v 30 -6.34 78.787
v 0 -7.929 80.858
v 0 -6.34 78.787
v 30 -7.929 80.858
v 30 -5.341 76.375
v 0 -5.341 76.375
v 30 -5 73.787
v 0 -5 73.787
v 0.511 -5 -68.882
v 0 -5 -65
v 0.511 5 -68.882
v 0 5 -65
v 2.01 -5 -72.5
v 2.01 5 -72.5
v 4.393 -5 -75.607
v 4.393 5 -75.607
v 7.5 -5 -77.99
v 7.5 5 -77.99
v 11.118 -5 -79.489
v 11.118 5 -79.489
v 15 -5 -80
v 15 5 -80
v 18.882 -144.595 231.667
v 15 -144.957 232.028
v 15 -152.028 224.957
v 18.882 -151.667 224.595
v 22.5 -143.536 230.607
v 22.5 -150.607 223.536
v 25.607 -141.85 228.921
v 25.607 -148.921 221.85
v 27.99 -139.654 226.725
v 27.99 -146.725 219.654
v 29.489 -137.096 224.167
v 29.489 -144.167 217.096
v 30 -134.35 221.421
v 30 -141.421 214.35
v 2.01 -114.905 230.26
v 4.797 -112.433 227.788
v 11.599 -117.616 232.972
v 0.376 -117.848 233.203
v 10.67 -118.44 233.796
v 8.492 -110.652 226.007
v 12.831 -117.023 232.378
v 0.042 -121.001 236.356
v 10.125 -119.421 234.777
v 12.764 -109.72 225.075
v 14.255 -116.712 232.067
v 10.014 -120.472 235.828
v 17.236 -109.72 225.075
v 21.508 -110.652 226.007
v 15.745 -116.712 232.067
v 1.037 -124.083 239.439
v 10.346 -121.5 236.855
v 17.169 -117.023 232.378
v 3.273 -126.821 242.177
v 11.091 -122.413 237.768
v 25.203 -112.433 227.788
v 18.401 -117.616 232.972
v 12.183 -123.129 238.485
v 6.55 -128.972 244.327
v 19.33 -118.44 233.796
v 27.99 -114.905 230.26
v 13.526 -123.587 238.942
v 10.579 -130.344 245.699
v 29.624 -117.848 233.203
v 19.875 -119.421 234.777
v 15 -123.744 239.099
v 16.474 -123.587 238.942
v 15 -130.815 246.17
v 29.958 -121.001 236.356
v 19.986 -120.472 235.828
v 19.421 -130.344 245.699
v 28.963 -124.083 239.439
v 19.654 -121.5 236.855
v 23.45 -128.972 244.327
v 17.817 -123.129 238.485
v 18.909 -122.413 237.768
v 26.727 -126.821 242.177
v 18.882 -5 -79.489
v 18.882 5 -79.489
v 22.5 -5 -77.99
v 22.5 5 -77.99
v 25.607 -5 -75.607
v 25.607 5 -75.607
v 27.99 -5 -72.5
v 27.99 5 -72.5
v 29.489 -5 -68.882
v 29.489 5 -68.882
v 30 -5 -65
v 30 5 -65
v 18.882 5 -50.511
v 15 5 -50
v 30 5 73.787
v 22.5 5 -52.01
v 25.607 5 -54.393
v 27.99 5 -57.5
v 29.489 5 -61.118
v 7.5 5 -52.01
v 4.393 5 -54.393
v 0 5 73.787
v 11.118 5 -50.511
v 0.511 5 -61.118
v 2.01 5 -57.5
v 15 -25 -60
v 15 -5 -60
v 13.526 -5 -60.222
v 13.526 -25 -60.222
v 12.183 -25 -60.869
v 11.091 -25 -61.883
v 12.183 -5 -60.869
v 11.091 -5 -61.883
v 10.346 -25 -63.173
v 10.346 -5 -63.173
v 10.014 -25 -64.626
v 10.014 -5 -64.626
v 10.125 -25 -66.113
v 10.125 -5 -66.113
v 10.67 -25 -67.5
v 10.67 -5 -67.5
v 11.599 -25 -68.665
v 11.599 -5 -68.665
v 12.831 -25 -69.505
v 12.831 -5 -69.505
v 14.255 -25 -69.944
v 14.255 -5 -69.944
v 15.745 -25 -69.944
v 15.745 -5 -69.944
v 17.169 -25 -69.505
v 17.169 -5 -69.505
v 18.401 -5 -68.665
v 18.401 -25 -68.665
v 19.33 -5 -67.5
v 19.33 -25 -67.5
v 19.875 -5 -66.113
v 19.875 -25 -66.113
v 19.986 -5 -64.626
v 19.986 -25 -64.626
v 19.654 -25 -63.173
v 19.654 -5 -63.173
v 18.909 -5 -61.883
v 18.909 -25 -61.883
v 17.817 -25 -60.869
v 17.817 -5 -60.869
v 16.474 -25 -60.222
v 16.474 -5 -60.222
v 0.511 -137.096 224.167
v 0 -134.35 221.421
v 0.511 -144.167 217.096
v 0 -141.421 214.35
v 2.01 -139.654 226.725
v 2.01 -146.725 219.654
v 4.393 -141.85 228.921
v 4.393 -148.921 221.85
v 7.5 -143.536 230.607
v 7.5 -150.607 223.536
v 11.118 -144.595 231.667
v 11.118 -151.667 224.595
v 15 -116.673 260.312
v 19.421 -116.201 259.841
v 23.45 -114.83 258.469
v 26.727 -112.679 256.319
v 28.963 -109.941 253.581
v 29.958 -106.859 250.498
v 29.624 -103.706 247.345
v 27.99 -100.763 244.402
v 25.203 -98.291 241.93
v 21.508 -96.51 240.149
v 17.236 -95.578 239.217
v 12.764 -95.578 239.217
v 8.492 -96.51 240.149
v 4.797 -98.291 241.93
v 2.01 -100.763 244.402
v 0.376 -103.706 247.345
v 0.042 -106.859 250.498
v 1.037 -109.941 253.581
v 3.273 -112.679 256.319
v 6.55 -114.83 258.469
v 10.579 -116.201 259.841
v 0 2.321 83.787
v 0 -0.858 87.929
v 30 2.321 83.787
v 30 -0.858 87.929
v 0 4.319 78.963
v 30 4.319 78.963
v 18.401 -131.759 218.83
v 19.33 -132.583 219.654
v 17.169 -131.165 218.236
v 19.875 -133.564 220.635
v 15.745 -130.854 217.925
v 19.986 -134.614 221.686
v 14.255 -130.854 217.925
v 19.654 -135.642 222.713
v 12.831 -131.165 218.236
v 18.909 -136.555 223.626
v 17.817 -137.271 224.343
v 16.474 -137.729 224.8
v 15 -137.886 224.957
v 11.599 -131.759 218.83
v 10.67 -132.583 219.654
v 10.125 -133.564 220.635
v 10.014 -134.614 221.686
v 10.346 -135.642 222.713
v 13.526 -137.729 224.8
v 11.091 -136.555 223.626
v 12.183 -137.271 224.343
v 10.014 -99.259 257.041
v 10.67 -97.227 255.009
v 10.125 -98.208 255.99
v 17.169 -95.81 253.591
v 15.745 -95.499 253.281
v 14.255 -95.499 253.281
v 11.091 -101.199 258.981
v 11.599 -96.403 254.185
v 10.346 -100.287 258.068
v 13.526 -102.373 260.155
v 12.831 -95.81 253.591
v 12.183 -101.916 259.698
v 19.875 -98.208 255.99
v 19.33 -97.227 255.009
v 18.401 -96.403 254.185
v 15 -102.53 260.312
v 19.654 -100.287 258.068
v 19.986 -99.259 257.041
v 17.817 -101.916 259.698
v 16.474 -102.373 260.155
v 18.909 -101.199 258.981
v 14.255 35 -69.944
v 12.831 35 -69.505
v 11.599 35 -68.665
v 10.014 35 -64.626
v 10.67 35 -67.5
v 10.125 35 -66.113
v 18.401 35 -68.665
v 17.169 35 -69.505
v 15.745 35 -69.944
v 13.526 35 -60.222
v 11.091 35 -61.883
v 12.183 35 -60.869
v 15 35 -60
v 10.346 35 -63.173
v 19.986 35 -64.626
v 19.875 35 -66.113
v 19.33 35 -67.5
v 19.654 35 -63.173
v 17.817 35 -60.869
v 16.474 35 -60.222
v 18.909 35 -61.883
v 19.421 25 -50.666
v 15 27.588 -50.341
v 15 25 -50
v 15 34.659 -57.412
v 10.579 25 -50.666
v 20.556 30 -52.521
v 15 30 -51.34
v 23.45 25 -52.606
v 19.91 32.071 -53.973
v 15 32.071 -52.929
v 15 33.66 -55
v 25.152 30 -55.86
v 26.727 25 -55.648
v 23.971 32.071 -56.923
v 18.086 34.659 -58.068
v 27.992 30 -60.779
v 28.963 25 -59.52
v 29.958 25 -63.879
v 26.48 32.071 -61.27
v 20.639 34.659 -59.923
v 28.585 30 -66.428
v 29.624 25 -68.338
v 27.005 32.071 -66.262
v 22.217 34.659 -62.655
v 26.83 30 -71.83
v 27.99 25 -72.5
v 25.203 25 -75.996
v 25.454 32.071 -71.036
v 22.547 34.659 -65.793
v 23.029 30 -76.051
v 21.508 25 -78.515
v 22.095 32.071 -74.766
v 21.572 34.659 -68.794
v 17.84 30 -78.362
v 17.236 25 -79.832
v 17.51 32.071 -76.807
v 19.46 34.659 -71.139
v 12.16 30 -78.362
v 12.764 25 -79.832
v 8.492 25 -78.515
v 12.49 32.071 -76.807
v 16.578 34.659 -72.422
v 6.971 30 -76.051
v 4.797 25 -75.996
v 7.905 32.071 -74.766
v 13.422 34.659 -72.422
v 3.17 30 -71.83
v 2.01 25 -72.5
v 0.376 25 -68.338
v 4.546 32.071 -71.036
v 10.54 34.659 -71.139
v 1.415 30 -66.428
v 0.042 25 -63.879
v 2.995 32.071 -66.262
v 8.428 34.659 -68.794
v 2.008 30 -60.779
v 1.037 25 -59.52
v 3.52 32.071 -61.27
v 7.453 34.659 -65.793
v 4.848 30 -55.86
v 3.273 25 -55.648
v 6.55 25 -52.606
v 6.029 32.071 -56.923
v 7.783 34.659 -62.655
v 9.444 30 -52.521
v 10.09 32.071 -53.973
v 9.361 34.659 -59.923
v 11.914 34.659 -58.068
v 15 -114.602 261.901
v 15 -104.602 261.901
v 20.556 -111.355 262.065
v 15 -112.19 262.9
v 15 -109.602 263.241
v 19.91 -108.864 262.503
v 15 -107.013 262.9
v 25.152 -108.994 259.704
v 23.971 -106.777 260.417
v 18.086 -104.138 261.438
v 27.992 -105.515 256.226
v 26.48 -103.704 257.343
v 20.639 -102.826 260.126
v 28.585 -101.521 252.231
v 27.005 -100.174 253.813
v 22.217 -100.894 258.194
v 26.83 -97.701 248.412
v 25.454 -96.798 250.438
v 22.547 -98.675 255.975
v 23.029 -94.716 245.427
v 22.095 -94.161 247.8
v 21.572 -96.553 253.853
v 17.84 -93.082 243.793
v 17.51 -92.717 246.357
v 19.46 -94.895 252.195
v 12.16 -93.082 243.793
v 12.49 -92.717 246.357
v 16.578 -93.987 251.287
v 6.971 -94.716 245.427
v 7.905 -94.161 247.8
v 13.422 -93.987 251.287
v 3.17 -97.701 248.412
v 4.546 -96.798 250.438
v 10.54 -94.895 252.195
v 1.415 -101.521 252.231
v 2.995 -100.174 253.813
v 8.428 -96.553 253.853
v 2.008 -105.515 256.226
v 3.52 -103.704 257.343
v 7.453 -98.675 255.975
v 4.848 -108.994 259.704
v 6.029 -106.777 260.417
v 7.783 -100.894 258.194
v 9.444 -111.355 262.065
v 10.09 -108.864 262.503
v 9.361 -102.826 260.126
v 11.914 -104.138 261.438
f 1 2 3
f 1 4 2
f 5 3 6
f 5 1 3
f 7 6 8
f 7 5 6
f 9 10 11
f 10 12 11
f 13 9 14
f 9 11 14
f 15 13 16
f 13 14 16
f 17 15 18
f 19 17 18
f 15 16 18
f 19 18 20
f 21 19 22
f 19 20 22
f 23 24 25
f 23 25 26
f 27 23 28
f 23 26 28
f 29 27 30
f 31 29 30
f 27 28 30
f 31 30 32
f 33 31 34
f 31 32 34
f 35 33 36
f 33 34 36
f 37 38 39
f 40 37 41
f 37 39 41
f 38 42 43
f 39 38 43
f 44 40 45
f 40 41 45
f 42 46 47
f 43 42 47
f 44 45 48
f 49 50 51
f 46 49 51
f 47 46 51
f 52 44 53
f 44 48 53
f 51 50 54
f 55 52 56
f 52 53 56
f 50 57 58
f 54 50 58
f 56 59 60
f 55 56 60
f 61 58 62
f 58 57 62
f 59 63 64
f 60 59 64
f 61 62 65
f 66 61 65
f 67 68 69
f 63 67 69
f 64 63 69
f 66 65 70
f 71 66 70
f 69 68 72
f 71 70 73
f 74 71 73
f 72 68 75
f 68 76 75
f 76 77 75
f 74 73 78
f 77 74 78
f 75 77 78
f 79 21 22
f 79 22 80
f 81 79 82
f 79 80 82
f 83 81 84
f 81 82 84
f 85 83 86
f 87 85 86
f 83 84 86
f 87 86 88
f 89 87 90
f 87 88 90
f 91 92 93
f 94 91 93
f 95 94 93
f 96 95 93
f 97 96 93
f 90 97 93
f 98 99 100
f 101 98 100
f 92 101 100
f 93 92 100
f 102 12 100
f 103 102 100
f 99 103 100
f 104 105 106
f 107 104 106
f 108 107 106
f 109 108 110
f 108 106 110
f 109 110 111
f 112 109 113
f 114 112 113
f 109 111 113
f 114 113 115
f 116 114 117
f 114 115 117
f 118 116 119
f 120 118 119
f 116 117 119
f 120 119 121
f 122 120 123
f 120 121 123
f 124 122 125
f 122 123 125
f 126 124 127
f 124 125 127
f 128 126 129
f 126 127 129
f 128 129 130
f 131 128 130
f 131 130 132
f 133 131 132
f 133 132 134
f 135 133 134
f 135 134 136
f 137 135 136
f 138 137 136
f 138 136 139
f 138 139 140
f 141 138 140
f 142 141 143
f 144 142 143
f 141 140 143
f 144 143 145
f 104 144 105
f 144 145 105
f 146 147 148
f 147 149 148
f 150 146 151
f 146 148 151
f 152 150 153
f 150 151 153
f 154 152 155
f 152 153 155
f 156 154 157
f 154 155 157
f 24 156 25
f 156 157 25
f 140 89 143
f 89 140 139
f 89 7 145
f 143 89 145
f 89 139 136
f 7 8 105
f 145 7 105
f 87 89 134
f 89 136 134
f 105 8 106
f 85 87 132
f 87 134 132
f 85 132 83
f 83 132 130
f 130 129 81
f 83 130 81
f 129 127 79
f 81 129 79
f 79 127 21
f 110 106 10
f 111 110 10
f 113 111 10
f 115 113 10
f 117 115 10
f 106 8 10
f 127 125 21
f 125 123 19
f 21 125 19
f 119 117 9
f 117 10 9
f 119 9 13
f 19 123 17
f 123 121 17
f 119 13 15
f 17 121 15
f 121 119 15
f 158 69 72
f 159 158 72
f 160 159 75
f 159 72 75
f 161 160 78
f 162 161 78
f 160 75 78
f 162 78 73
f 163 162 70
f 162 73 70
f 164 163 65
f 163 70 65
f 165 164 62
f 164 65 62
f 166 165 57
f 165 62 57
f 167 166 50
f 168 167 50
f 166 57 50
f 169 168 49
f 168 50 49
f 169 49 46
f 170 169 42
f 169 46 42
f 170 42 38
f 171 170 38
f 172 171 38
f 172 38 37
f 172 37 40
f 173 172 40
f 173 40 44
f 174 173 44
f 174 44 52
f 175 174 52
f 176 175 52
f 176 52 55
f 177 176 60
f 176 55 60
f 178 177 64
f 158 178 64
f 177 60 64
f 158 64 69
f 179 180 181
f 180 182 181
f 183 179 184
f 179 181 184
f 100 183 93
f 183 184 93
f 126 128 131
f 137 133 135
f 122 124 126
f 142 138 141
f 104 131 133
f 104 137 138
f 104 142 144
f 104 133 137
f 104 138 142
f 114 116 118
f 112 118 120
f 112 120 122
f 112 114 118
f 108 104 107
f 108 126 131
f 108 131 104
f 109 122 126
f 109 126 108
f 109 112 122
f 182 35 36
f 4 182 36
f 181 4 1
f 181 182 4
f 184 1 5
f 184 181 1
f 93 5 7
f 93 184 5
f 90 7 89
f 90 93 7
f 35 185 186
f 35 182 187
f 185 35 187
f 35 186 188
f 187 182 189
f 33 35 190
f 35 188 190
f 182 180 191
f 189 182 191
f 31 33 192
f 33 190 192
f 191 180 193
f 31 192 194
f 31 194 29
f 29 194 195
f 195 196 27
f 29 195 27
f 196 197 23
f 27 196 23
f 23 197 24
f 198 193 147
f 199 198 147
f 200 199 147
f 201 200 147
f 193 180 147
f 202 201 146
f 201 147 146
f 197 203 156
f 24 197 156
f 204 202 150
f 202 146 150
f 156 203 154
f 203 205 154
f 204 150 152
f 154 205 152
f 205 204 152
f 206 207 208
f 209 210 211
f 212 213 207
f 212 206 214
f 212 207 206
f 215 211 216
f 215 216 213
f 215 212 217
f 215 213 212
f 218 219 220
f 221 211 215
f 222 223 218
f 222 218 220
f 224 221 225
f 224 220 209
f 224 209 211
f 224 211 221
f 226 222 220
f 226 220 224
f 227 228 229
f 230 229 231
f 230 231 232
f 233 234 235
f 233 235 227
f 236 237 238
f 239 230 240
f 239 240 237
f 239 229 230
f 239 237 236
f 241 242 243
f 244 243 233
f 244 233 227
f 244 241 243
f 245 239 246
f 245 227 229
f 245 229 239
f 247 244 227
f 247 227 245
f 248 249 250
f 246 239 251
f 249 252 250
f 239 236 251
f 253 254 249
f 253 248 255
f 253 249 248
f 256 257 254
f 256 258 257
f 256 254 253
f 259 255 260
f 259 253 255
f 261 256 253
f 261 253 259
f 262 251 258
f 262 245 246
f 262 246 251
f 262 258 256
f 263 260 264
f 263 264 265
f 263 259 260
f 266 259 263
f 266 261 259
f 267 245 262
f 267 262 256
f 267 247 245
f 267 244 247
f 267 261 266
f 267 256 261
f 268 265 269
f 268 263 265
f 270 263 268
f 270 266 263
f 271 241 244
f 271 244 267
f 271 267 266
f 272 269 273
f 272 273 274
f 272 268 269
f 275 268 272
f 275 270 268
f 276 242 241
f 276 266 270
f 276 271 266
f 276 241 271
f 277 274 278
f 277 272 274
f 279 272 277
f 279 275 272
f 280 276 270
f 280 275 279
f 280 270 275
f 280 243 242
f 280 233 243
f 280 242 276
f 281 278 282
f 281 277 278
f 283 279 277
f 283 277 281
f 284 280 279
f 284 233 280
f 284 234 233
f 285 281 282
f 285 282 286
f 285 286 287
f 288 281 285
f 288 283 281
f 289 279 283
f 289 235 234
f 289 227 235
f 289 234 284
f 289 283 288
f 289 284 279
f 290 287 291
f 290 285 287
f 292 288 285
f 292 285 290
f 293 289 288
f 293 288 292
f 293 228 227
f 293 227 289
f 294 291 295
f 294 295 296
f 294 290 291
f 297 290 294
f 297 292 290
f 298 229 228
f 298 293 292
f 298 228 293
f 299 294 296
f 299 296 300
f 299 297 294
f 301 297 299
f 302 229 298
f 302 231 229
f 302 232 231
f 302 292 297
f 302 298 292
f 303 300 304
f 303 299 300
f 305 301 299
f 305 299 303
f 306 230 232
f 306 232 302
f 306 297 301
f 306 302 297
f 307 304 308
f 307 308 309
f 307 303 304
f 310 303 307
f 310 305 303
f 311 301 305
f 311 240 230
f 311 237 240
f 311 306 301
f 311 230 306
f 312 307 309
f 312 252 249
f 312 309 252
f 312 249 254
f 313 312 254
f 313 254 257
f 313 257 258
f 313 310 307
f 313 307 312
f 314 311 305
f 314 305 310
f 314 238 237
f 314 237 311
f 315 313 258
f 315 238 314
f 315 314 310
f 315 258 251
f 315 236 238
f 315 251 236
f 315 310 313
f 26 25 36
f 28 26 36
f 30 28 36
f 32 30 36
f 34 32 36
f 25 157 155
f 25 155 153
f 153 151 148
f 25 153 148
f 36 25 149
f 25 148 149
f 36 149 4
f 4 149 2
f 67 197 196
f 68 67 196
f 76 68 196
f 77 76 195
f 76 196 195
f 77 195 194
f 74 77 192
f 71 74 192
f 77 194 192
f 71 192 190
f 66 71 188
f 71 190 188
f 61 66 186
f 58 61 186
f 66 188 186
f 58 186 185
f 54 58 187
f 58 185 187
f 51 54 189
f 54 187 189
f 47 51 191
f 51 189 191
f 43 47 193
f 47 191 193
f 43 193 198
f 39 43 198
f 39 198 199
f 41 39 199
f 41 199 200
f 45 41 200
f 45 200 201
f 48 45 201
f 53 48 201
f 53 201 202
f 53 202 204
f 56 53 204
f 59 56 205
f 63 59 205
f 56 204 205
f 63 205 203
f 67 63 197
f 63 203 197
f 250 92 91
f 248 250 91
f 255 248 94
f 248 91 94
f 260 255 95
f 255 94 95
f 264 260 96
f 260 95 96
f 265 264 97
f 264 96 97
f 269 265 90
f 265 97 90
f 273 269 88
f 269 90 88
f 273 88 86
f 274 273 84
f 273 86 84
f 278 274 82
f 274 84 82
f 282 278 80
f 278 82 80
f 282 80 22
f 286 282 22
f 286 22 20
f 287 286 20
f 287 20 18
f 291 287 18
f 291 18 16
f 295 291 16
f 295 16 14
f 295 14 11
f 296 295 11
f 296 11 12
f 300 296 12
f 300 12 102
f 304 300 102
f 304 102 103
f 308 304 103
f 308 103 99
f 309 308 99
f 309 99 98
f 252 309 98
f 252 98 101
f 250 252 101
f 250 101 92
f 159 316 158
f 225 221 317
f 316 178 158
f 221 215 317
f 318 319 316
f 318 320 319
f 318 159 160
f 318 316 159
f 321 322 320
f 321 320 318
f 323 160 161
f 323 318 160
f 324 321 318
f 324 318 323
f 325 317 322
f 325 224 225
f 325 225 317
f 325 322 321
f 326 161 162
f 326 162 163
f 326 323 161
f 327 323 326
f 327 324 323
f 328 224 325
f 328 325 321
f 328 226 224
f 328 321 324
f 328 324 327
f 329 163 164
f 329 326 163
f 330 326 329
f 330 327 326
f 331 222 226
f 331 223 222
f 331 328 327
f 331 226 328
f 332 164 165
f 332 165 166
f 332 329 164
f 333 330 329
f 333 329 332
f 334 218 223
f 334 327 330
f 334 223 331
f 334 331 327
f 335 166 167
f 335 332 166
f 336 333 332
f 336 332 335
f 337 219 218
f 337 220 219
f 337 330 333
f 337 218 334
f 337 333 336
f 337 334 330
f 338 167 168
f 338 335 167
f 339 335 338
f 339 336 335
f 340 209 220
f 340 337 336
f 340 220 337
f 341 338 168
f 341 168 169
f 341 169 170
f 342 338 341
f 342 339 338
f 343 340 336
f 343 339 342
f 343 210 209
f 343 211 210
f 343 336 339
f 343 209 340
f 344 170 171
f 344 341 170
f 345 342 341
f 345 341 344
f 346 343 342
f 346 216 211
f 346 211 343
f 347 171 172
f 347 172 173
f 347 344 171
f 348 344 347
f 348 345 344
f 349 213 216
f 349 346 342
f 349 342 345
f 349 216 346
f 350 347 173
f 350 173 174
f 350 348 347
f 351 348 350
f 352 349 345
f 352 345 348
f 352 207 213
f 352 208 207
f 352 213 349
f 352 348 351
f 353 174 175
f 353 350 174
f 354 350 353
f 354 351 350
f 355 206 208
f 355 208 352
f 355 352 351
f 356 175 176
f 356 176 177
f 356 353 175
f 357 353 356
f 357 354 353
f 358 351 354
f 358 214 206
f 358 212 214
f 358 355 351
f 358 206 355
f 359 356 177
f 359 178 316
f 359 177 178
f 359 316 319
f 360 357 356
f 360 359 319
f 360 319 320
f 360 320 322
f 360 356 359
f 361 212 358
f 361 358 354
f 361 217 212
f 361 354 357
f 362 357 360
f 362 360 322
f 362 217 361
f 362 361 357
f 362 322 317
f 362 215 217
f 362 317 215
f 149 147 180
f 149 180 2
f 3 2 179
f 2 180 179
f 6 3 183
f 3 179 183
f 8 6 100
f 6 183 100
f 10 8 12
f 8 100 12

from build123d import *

# Parameters (mm, degrees)
BOSS_EXTRUDE1_DEPTH = 30
FILLET1_R           = 10
FILLET2_R           = 20
FILLET3_R           = 15
FILLET4_R           = 15
SKETCH2_R           = 5
BOSS_EXTRUDE2_DEPTH = 20
SKETCH3_R           = 15
BOSS_EXTRUDE3_DEPTH = 30
FILLET5_R           = 10
SKETCH4_R           = 5
BOSS_EXTRUDE4_DEPTH = 20
SKETCH5_R           = 15
BOSS_EXTRUDE5_DEPTH = 30
FILLET6_R           = 10


with BuildPart() as part:
    # Sketch1 → Boss-Extrude1 (new body)
    with BuildSketch(Plane(origin=(0, 0, 0), x_dir=(0, 0, -1), z_dir=(1, 0, 0))):
        Polygon((-224.956890143, -152.027957955), (-77.928932188, -5), (80, -5), (80, 5), (-82.071067812, 5), (-232.027957955, -144.956890143), align=None)
    extrude(amount=BOSS_EXTRUDE1_DEPTH)

    # Fillet1
    fillet1_edges = [part.edges().sort_by_distance(p)[0] for p in [
        (15, -5, 77.928932188),
    ]]
    fillet(fillet1_edges, radius=FILLET1_R)

    # Fillet2
    fillet2_edges = [part.edges().sort_by_distance(p)[0] for p in [
        (15, 5, 82.071067812),
    ]]
    fillet(fillet2_edges, radius=FILLET2_R)

    # Fillet3
    fillet3_edges = [part.edges().sort_by_distance(p)[0] for p in [
        (30, -148.492424049, 228.492424049),
        (0, -148.492424049, 228.492424049),
    ]]
    fillet(fillet3_edges, radius=FILLET3_R - 0.0001)  # a hair under: the kernel refuses the full size

    # Fillet4
    fillet4_edges = [part.edges().sort_by_distance(p)[0] for p in [
        (30, 0, -80),
        (0, 0, -80),
    ]]
    fillet(fillet4_edges, radius=FILLET4_R - 0.0001)  # a hair under: the kernel refuses the full size

    # Sketch2 → Boss-Extrude2 (add)
    with BuildSketch(Plane(origin=(0, 43.535533906, 43.535533906), x_dir=(1, 0, 0), z_dir=(0, 0.7071067811865471, 0.7071067811865479))):
        with Locations(Location((15, -251.568542495, 0), (0, 0, 270))):
            Circle(SKETCH2_R)
    extrude(amount=BOSS_EXTRUDE2_DEPTH)

    # Sketch3 → Boss-Extrude3 (add)
    with BuildSketch(Plane(origin=(0, 57.67766953, 57.67766953), x_dir=(1, 0, 0), z_dir=(0, 0.7071067811865471, 0.7071067811865479))):
        with Locations(Location((15, -251.568542495, 0), (0, 0, 270))):
            Circle(SKETCH3_R)
    extrude(amount=BOSS_EXTRUDE3_DEPTH)

    # Fillet5
    fillet5_edges = [part.edges().sort_by_distance(p)[0] for p in [
        (15, -88.388347648, 246.170093579),
    ]]
    fillet(fillet5_edges, radius=FILLET5_R)

    # Sketch4 → Boss-Extrude4 (add)
    with BuildSketch(Plane.XZ.offset(5)):
        with Locations(Location((15, -65, 0), (0, 0, 90))):
            Circle(SKETCH4_R)
    extrude(amount=BOSS_EXTRUDE4_DEPTH)

    # Sketch5 → Boss-Extrude5 (add)
    with BuildSketch(Plane(origin=(0, 5, 0), x_dir=(1, 0, 0), z_dir=(0, 1, 0))):
        with Locations(Location((15, 65, 0), (0, 0, 270))):
            Circle(SKETCH5_R)
    extrude(amount=BOSS_EXTRUDE5_DEPTH)

    # Fillet6
    fillet6_edges = [part.edges().sort_by_distance(p)[0] for p in [
        (15, 35, -80),
    ]]
    fillet(fillet6_edges, radius=FILLET6_R)


solid = part.part
